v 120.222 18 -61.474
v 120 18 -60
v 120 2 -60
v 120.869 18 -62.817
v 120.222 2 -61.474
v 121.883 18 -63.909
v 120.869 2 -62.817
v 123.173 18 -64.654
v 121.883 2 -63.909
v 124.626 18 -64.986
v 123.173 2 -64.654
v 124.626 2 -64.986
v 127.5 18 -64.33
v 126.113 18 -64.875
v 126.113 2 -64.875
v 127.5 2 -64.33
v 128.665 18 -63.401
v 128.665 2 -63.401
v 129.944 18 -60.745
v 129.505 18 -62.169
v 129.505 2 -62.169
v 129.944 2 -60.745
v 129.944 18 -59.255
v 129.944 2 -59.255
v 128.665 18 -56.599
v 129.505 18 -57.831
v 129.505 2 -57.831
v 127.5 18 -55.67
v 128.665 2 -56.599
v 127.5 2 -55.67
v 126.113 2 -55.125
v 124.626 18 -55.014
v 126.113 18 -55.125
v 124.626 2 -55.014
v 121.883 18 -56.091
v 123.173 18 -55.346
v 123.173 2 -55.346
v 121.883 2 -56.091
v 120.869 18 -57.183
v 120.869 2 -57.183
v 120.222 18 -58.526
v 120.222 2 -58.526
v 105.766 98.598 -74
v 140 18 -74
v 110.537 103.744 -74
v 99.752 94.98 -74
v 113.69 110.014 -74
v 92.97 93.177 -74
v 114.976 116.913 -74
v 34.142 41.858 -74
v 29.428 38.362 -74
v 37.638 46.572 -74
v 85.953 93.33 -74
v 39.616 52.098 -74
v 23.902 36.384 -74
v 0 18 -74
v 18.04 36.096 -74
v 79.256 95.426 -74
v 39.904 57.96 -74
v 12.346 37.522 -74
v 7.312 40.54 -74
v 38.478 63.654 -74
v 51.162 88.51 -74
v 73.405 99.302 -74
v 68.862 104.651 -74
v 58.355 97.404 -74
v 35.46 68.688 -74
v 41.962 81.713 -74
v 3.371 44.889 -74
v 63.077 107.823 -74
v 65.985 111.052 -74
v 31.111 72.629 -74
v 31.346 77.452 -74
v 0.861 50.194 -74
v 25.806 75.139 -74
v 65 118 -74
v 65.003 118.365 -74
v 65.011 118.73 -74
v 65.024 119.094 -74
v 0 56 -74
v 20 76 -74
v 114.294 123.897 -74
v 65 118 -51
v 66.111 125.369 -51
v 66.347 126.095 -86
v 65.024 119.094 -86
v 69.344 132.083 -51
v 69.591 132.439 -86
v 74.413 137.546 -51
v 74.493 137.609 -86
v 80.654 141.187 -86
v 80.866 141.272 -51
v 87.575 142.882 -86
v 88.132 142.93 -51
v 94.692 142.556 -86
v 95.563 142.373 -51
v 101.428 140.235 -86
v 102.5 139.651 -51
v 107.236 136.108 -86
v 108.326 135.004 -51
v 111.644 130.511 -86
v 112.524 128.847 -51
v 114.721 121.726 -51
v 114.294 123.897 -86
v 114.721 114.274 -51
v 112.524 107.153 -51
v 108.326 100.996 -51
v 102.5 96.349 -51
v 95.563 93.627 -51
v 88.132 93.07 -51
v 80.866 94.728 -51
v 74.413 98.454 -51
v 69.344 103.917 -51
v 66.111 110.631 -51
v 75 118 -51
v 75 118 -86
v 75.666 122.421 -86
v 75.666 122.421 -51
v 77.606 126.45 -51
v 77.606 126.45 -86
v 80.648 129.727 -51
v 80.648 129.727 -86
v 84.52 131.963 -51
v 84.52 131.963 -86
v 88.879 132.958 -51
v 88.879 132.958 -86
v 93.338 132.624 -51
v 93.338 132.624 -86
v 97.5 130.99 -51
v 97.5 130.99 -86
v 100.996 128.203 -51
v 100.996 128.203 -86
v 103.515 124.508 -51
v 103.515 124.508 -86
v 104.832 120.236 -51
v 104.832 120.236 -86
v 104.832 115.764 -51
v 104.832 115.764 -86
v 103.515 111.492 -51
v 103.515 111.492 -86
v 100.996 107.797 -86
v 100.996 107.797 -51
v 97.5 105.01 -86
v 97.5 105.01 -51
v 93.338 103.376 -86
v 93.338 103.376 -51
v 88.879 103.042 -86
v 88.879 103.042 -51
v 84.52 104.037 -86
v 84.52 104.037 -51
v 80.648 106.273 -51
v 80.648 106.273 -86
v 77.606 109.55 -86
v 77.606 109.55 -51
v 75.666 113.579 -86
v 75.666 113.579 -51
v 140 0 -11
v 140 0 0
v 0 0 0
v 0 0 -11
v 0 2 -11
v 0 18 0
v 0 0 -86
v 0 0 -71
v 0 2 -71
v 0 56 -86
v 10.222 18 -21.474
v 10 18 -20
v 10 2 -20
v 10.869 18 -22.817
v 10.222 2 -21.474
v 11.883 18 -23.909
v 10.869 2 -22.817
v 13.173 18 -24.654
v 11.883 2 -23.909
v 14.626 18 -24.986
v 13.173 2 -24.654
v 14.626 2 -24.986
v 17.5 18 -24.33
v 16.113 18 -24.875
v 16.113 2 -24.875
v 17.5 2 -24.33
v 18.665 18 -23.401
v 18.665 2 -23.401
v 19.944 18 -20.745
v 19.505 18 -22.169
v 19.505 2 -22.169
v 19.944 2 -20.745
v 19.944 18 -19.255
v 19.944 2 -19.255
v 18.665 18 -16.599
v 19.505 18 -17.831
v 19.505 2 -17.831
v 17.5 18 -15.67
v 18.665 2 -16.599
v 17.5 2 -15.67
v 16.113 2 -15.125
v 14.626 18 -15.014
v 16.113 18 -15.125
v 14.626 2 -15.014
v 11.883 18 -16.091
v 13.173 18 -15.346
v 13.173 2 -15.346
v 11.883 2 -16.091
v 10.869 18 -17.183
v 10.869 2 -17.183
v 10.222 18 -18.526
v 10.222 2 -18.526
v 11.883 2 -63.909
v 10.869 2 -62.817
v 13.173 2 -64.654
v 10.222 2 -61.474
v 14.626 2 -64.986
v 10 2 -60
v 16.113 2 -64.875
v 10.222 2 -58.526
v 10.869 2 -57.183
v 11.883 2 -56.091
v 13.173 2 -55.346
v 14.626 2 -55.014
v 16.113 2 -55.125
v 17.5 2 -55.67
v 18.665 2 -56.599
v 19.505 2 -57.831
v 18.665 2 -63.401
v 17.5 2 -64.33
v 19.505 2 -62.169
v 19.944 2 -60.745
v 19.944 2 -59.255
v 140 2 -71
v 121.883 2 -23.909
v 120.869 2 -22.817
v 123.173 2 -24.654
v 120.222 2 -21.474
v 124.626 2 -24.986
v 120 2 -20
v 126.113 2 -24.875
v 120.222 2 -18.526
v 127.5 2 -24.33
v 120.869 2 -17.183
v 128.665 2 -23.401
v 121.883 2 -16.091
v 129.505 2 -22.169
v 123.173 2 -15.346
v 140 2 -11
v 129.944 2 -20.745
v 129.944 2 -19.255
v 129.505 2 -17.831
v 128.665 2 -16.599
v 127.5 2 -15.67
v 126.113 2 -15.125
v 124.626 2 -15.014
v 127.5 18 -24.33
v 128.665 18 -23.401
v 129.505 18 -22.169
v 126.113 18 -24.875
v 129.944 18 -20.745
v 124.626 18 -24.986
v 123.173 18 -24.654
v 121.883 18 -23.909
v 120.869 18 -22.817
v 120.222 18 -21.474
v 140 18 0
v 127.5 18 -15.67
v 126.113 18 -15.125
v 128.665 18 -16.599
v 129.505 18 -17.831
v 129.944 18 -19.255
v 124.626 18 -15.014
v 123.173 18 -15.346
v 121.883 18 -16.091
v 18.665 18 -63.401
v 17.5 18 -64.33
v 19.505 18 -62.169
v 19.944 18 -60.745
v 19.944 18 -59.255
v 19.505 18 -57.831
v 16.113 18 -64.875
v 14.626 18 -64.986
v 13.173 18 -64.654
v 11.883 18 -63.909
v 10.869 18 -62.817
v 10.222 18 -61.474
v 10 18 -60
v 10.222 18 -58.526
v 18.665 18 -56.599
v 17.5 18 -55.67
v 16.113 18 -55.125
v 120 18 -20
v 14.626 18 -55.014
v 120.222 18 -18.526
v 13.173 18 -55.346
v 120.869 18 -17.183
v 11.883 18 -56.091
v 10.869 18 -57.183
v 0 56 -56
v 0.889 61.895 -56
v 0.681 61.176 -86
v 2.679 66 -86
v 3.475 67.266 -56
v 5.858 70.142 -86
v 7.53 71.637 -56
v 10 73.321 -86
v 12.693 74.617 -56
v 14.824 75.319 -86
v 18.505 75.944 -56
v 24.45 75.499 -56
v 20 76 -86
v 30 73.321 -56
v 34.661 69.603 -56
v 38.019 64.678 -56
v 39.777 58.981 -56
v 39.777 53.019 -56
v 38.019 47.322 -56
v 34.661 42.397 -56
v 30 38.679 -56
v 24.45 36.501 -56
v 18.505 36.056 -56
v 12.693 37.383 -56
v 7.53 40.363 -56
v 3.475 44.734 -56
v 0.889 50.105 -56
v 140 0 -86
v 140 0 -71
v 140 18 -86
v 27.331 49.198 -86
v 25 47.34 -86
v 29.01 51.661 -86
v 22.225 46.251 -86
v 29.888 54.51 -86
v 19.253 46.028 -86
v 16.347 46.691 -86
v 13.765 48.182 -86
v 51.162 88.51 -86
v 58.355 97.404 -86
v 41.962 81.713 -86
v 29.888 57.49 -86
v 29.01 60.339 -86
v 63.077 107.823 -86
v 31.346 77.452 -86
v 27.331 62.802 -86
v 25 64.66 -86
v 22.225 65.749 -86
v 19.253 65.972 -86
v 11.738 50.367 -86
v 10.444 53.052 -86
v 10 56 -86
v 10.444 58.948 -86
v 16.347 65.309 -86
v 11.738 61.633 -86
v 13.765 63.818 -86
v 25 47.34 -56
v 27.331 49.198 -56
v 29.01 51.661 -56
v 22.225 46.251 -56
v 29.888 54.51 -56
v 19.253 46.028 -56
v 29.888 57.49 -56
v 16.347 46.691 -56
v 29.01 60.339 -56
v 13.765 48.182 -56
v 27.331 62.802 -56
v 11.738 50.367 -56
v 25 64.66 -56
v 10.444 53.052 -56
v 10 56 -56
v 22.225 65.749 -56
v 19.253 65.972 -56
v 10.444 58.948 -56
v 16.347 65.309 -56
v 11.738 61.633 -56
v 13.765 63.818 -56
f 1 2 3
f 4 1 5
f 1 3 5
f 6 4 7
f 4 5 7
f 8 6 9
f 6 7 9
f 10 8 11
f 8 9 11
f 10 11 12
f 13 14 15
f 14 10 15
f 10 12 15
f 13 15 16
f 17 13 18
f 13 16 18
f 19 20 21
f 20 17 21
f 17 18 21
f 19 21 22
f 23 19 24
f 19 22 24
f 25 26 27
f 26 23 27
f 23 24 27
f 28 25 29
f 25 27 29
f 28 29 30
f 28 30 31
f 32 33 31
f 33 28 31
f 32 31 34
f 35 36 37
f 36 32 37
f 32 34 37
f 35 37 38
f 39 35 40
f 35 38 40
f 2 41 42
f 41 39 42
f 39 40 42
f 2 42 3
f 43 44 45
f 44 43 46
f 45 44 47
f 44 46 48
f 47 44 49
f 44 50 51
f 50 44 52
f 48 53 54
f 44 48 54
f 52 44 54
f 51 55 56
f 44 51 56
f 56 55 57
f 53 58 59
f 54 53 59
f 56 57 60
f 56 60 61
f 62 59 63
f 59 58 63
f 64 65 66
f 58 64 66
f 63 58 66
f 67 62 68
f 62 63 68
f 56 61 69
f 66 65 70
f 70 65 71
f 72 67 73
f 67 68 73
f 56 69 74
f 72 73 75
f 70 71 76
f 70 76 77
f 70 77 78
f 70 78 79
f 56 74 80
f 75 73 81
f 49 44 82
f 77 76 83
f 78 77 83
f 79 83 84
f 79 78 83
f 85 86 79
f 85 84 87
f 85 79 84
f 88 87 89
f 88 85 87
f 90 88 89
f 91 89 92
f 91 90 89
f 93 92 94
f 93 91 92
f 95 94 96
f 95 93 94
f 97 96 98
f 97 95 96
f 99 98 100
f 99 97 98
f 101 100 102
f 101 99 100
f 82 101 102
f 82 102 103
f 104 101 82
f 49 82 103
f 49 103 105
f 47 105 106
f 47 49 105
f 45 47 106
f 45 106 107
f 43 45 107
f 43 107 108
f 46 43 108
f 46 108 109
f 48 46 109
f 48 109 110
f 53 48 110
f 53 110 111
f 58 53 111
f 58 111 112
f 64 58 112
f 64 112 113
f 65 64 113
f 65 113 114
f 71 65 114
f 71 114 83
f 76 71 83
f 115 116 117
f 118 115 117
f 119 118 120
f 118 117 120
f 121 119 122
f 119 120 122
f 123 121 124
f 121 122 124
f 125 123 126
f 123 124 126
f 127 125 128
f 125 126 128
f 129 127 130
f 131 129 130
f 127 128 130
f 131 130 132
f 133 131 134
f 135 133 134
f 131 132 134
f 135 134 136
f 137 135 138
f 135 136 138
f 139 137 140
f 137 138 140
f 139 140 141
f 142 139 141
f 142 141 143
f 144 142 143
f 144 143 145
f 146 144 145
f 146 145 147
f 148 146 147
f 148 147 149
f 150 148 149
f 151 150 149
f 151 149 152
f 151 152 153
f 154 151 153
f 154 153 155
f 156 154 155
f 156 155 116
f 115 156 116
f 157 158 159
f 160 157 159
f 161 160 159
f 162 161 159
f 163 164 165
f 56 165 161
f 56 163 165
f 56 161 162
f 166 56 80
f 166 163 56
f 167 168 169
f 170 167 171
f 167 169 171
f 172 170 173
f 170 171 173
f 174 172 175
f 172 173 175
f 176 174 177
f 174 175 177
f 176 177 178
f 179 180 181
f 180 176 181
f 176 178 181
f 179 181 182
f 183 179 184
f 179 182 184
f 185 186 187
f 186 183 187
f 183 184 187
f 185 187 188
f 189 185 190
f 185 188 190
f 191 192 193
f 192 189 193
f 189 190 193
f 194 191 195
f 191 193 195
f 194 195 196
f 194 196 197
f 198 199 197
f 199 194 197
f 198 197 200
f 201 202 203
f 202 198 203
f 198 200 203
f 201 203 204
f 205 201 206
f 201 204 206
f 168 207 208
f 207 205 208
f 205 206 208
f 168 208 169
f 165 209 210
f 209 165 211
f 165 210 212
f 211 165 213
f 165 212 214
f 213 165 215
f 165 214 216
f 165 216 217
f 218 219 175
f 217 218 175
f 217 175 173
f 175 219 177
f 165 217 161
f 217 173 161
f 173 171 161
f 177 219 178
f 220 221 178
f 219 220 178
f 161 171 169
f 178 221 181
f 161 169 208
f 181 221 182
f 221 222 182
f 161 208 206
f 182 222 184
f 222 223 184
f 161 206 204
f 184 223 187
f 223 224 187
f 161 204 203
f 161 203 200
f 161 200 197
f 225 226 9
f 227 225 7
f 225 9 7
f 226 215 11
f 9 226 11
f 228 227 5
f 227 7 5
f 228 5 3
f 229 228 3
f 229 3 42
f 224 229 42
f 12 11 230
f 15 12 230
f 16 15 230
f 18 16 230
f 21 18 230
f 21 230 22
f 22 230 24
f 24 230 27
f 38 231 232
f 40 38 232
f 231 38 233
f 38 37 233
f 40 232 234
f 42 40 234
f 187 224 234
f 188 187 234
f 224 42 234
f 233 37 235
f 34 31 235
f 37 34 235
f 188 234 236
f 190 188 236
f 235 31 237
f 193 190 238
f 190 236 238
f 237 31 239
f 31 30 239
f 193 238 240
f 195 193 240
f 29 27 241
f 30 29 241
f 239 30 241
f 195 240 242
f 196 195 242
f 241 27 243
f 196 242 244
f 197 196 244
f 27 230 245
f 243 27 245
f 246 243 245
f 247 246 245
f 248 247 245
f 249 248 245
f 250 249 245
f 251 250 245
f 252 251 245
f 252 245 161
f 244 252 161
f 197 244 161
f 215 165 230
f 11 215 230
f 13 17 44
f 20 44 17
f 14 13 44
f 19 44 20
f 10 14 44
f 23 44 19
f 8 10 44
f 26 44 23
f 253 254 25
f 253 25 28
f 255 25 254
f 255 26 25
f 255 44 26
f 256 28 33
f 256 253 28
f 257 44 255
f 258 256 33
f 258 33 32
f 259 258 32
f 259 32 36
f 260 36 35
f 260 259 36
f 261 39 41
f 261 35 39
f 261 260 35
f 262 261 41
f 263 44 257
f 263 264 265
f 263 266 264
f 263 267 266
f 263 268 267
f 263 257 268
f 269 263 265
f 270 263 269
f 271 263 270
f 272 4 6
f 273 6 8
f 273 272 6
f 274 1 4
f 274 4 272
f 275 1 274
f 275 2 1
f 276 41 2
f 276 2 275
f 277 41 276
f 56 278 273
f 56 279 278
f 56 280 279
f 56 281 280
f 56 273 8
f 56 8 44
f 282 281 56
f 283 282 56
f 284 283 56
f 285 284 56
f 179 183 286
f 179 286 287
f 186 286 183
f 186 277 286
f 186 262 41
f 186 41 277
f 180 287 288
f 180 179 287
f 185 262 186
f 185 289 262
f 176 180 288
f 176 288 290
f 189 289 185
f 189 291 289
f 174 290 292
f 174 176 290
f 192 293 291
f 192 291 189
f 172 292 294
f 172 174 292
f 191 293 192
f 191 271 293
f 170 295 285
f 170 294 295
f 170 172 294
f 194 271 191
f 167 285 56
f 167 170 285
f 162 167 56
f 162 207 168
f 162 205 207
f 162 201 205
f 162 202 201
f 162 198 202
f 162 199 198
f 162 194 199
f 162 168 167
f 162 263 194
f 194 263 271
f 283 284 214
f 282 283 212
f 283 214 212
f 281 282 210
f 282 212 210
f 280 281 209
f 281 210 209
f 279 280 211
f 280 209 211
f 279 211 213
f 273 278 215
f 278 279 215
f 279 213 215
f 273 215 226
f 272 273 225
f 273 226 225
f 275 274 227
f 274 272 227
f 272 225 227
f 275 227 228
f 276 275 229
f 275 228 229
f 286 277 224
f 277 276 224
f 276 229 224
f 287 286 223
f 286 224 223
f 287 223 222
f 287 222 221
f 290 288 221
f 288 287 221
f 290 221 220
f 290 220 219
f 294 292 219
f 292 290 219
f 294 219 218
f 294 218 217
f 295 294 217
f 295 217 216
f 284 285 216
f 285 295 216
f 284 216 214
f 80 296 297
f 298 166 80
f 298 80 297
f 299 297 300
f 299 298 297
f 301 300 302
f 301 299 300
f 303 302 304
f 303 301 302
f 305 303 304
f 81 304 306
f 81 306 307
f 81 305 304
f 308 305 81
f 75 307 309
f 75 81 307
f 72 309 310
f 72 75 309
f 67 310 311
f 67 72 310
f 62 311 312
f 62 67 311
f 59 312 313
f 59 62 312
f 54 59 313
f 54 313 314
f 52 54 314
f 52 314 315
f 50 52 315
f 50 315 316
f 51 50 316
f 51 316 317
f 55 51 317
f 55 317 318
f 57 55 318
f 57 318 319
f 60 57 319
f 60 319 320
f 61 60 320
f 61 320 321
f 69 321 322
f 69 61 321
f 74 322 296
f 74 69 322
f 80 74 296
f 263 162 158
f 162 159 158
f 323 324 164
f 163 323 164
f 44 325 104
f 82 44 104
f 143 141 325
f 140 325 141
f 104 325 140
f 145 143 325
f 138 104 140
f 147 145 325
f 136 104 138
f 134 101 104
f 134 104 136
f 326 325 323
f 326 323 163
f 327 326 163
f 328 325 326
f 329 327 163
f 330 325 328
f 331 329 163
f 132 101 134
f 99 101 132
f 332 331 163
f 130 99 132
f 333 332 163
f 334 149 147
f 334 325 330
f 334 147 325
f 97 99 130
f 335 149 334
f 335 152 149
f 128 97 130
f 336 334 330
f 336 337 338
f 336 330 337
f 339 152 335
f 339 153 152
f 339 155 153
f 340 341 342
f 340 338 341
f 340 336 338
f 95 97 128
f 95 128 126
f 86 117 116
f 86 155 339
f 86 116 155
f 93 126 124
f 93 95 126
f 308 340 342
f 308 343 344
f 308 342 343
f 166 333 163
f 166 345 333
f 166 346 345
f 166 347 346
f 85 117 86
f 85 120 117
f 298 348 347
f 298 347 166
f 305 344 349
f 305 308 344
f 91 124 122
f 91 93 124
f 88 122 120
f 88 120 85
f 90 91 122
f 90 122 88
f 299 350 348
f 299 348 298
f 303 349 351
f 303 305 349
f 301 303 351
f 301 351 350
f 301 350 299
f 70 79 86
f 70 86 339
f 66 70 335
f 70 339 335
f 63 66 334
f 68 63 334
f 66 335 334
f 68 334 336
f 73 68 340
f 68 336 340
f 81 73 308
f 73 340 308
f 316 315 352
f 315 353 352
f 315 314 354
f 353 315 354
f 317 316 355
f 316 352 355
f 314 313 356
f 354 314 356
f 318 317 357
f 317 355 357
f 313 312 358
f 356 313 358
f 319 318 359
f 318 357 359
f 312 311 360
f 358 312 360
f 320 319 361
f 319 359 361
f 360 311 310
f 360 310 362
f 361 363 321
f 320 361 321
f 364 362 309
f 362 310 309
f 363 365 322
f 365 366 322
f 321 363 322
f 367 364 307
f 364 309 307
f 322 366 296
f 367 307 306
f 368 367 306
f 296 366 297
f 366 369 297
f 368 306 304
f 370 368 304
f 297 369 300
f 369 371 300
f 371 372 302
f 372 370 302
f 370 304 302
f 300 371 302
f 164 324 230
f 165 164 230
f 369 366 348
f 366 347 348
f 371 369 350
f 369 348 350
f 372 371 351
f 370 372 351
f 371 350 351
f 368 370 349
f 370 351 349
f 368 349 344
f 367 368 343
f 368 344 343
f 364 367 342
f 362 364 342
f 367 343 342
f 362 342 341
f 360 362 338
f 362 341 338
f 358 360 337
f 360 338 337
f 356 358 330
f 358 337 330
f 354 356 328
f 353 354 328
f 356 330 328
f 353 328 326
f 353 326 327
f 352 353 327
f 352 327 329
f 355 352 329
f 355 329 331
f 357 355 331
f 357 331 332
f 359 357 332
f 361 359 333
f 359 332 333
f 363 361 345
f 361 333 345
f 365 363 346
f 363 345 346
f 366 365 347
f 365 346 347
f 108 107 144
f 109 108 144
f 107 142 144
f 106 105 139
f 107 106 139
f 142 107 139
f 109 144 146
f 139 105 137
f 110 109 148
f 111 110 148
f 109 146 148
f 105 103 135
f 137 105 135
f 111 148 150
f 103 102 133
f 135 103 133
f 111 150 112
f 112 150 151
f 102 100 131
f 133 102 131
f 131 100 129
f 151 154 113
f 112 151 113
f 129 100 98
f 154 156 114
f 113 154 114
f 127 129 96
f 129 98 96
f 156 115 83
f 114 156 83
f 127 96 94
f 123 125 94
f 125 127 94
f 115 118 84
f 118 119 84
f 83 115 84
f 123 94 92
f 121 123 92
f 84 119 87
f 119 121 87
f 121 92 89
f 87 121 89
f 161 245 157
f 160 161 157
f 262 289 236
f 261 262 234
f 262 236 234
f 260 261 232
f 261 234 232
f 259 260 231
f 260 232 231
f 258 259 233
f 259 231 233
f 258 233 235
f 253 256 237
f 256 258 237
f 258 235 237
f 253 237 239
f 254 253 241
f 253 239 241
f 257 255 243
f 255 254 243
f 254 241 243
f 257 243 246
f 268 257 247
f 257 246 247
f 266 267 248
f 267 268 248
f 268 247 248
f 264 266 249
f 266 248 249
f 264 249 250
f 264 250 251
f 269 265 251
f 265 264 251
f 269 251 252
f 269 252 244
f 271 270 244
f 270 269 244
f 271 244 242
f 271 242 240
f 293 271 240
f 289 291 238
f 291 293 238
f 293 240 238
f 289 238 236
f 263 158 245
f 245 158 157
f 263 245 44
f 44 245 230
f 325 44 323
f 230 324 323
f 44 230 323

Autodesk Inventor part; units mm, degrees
ref_plane "YZ Plane" through (0, 0, 0) normal (1, 0, 0) x (0, 1, 0)
ref_plane "XZ Plane" through (0, 0, 0) normal (0, 1, 0) x (-1, 0, 0)
sketch "Sketch1" plane through (0, 0, 0) normal (0, 1, 0) x (-1, 0, 0)
  line L0 (0, 0) -> (-140, 0)
  line L1 (-140, 0) -> (-140, -86)
  line L2 (-140, -86) -> (0, -86)
  line L3 (0, -86) -> (0, 0)
  line L4 (0, 0) -> (-15, 0) construction
  line L5 (-15, 0) -> (-15, -20) construction
  line L6 (-15, -20) -> (0, -20) construction
  line L7 (0, -20) -> (0, 0) construction
  circle A0 centre (-15, -20) radius 5
  line L8 (0, -43) -> (-140, -43) construction
  line L9 (-15, -20) -> (-125, -20) construction
  line L10 (-125, -20) -> (-125, -60) construction
  line L11 (-125, -60) -> (-15, -60) construction
  line L12 (-15, -60) -> (-15, -20) construction
  circle A1 centre (-125, -20) radius 5
  circle A2 centre (-125, -60) radius 5
  circle A3 centre (-15, -60) radius 5
  dimension "d0" = 140
  dimension "d1" = 86
  dimension "d2" = 15
  dimension "d3" = 20
  dimension "d4" = 10
  dimension "d5" = 110
  dimension "d6" = 40
  dimension "d7" = 10
  dimension "d8" = 10
  dimension "d9" = 10
extrude "Extrusion1" add sketch "Sketch1" along normal blind 18
sketch "Sketch2" plane through (140, 0, 0) normal (1, 0, 0) x (0, 0, -1)
  line L0 (0, 18) -> (86, 18) construction
  line L1 (0, 0) -> (86, 0) construction
  line L2 (0, 18) -> (86, 18) construction
  line L3 (86, 18) -> (86, 0) construction
  line L4 (86, 0) -> (0, 0) construction
  line L5 (0, 0) -> (0, 18) construction
  line L6 (86, 0) -> (71, 0) construction
  line L7 (71, 0) -> (71, 2) construction
  line L8 (71, 2) -> (86, 2) construction
  line L9 (86, 2) -> (86, 0) construction
  line L10 (71, 2) -> (11, 2)
  line L11 (11, 2) -> (11, 0)
  line L12 (11, 0) -> (71, 0)
  line L13 (71, 0) -> (71, 2)
  dimension "d12" = 15
  dimension "d13" = 2
  dimension "d14" = 60
extrude "Extrusion2" cut sketch "Sketch2" against normal up to surface (140 mm away)
ref_plane "Work Plane1" through (140, 9, -86) normal (0, 0, -1) x (-1, 0, 0)
sketch "Sketch3" plane through (140, 9, -86) normal (0, 0, -1) x (-1, 0, 0)
  line L0 (140, 9) -> (0, 9) construction
  line L1 (140, -9) -> (0, -9) construction
  line L2 (0, -9) -> (0, 9) construction
  line L3 (140, 9) -> (0, 9) projected
  line L4 (140, -9) -> (140, 9) construction
  line L5 (140, -9) -> (140, 9) construction
  circle A0 centre (120, 47) radius 20
  arc A1 (74.976, 110.0944) -> (120, 67) centre (120, 112.0672) ccw
  circle A2 centre (120, 47) radius 10
  line L6 (0, -9) -> (50, -9) construction
  line L7 (50, -9) -> (50, 109) construction
  line L8 (50, 109) -> (0, 109) construction
  line L9 (0, 109) -> (0, -9) construction
  circle A3 centre (50, 109) radius 25
  circle A4 centre (50, 109) radius 15
  line L10 (120, 47) -> (120, 67) construction
  line L11 (0, 9) -> (25.7055, 114.8972)
  line L12 (140, 9) -> (140, 47)
  dimension "d17" = 56
  dimension "d18" = 40
  dimension "d19" = 20
  dimension "d20" = 50
  dimension "d21" = 118
  dimension "d22" = 50
  dimension "d23" = 30
extrude "Extrusion3" add sketch "Sketch3" against normal blind 12 contours L3 L11 A3 A1 A0 L12
extrude "Extrusion4" add sketch "Sketch3" against normal blind 35 contours A3
extrude "Extrusion5" add sketch "Sketch3" against normal blind 30 contours A0
properties part number "CE-1.3.4"
